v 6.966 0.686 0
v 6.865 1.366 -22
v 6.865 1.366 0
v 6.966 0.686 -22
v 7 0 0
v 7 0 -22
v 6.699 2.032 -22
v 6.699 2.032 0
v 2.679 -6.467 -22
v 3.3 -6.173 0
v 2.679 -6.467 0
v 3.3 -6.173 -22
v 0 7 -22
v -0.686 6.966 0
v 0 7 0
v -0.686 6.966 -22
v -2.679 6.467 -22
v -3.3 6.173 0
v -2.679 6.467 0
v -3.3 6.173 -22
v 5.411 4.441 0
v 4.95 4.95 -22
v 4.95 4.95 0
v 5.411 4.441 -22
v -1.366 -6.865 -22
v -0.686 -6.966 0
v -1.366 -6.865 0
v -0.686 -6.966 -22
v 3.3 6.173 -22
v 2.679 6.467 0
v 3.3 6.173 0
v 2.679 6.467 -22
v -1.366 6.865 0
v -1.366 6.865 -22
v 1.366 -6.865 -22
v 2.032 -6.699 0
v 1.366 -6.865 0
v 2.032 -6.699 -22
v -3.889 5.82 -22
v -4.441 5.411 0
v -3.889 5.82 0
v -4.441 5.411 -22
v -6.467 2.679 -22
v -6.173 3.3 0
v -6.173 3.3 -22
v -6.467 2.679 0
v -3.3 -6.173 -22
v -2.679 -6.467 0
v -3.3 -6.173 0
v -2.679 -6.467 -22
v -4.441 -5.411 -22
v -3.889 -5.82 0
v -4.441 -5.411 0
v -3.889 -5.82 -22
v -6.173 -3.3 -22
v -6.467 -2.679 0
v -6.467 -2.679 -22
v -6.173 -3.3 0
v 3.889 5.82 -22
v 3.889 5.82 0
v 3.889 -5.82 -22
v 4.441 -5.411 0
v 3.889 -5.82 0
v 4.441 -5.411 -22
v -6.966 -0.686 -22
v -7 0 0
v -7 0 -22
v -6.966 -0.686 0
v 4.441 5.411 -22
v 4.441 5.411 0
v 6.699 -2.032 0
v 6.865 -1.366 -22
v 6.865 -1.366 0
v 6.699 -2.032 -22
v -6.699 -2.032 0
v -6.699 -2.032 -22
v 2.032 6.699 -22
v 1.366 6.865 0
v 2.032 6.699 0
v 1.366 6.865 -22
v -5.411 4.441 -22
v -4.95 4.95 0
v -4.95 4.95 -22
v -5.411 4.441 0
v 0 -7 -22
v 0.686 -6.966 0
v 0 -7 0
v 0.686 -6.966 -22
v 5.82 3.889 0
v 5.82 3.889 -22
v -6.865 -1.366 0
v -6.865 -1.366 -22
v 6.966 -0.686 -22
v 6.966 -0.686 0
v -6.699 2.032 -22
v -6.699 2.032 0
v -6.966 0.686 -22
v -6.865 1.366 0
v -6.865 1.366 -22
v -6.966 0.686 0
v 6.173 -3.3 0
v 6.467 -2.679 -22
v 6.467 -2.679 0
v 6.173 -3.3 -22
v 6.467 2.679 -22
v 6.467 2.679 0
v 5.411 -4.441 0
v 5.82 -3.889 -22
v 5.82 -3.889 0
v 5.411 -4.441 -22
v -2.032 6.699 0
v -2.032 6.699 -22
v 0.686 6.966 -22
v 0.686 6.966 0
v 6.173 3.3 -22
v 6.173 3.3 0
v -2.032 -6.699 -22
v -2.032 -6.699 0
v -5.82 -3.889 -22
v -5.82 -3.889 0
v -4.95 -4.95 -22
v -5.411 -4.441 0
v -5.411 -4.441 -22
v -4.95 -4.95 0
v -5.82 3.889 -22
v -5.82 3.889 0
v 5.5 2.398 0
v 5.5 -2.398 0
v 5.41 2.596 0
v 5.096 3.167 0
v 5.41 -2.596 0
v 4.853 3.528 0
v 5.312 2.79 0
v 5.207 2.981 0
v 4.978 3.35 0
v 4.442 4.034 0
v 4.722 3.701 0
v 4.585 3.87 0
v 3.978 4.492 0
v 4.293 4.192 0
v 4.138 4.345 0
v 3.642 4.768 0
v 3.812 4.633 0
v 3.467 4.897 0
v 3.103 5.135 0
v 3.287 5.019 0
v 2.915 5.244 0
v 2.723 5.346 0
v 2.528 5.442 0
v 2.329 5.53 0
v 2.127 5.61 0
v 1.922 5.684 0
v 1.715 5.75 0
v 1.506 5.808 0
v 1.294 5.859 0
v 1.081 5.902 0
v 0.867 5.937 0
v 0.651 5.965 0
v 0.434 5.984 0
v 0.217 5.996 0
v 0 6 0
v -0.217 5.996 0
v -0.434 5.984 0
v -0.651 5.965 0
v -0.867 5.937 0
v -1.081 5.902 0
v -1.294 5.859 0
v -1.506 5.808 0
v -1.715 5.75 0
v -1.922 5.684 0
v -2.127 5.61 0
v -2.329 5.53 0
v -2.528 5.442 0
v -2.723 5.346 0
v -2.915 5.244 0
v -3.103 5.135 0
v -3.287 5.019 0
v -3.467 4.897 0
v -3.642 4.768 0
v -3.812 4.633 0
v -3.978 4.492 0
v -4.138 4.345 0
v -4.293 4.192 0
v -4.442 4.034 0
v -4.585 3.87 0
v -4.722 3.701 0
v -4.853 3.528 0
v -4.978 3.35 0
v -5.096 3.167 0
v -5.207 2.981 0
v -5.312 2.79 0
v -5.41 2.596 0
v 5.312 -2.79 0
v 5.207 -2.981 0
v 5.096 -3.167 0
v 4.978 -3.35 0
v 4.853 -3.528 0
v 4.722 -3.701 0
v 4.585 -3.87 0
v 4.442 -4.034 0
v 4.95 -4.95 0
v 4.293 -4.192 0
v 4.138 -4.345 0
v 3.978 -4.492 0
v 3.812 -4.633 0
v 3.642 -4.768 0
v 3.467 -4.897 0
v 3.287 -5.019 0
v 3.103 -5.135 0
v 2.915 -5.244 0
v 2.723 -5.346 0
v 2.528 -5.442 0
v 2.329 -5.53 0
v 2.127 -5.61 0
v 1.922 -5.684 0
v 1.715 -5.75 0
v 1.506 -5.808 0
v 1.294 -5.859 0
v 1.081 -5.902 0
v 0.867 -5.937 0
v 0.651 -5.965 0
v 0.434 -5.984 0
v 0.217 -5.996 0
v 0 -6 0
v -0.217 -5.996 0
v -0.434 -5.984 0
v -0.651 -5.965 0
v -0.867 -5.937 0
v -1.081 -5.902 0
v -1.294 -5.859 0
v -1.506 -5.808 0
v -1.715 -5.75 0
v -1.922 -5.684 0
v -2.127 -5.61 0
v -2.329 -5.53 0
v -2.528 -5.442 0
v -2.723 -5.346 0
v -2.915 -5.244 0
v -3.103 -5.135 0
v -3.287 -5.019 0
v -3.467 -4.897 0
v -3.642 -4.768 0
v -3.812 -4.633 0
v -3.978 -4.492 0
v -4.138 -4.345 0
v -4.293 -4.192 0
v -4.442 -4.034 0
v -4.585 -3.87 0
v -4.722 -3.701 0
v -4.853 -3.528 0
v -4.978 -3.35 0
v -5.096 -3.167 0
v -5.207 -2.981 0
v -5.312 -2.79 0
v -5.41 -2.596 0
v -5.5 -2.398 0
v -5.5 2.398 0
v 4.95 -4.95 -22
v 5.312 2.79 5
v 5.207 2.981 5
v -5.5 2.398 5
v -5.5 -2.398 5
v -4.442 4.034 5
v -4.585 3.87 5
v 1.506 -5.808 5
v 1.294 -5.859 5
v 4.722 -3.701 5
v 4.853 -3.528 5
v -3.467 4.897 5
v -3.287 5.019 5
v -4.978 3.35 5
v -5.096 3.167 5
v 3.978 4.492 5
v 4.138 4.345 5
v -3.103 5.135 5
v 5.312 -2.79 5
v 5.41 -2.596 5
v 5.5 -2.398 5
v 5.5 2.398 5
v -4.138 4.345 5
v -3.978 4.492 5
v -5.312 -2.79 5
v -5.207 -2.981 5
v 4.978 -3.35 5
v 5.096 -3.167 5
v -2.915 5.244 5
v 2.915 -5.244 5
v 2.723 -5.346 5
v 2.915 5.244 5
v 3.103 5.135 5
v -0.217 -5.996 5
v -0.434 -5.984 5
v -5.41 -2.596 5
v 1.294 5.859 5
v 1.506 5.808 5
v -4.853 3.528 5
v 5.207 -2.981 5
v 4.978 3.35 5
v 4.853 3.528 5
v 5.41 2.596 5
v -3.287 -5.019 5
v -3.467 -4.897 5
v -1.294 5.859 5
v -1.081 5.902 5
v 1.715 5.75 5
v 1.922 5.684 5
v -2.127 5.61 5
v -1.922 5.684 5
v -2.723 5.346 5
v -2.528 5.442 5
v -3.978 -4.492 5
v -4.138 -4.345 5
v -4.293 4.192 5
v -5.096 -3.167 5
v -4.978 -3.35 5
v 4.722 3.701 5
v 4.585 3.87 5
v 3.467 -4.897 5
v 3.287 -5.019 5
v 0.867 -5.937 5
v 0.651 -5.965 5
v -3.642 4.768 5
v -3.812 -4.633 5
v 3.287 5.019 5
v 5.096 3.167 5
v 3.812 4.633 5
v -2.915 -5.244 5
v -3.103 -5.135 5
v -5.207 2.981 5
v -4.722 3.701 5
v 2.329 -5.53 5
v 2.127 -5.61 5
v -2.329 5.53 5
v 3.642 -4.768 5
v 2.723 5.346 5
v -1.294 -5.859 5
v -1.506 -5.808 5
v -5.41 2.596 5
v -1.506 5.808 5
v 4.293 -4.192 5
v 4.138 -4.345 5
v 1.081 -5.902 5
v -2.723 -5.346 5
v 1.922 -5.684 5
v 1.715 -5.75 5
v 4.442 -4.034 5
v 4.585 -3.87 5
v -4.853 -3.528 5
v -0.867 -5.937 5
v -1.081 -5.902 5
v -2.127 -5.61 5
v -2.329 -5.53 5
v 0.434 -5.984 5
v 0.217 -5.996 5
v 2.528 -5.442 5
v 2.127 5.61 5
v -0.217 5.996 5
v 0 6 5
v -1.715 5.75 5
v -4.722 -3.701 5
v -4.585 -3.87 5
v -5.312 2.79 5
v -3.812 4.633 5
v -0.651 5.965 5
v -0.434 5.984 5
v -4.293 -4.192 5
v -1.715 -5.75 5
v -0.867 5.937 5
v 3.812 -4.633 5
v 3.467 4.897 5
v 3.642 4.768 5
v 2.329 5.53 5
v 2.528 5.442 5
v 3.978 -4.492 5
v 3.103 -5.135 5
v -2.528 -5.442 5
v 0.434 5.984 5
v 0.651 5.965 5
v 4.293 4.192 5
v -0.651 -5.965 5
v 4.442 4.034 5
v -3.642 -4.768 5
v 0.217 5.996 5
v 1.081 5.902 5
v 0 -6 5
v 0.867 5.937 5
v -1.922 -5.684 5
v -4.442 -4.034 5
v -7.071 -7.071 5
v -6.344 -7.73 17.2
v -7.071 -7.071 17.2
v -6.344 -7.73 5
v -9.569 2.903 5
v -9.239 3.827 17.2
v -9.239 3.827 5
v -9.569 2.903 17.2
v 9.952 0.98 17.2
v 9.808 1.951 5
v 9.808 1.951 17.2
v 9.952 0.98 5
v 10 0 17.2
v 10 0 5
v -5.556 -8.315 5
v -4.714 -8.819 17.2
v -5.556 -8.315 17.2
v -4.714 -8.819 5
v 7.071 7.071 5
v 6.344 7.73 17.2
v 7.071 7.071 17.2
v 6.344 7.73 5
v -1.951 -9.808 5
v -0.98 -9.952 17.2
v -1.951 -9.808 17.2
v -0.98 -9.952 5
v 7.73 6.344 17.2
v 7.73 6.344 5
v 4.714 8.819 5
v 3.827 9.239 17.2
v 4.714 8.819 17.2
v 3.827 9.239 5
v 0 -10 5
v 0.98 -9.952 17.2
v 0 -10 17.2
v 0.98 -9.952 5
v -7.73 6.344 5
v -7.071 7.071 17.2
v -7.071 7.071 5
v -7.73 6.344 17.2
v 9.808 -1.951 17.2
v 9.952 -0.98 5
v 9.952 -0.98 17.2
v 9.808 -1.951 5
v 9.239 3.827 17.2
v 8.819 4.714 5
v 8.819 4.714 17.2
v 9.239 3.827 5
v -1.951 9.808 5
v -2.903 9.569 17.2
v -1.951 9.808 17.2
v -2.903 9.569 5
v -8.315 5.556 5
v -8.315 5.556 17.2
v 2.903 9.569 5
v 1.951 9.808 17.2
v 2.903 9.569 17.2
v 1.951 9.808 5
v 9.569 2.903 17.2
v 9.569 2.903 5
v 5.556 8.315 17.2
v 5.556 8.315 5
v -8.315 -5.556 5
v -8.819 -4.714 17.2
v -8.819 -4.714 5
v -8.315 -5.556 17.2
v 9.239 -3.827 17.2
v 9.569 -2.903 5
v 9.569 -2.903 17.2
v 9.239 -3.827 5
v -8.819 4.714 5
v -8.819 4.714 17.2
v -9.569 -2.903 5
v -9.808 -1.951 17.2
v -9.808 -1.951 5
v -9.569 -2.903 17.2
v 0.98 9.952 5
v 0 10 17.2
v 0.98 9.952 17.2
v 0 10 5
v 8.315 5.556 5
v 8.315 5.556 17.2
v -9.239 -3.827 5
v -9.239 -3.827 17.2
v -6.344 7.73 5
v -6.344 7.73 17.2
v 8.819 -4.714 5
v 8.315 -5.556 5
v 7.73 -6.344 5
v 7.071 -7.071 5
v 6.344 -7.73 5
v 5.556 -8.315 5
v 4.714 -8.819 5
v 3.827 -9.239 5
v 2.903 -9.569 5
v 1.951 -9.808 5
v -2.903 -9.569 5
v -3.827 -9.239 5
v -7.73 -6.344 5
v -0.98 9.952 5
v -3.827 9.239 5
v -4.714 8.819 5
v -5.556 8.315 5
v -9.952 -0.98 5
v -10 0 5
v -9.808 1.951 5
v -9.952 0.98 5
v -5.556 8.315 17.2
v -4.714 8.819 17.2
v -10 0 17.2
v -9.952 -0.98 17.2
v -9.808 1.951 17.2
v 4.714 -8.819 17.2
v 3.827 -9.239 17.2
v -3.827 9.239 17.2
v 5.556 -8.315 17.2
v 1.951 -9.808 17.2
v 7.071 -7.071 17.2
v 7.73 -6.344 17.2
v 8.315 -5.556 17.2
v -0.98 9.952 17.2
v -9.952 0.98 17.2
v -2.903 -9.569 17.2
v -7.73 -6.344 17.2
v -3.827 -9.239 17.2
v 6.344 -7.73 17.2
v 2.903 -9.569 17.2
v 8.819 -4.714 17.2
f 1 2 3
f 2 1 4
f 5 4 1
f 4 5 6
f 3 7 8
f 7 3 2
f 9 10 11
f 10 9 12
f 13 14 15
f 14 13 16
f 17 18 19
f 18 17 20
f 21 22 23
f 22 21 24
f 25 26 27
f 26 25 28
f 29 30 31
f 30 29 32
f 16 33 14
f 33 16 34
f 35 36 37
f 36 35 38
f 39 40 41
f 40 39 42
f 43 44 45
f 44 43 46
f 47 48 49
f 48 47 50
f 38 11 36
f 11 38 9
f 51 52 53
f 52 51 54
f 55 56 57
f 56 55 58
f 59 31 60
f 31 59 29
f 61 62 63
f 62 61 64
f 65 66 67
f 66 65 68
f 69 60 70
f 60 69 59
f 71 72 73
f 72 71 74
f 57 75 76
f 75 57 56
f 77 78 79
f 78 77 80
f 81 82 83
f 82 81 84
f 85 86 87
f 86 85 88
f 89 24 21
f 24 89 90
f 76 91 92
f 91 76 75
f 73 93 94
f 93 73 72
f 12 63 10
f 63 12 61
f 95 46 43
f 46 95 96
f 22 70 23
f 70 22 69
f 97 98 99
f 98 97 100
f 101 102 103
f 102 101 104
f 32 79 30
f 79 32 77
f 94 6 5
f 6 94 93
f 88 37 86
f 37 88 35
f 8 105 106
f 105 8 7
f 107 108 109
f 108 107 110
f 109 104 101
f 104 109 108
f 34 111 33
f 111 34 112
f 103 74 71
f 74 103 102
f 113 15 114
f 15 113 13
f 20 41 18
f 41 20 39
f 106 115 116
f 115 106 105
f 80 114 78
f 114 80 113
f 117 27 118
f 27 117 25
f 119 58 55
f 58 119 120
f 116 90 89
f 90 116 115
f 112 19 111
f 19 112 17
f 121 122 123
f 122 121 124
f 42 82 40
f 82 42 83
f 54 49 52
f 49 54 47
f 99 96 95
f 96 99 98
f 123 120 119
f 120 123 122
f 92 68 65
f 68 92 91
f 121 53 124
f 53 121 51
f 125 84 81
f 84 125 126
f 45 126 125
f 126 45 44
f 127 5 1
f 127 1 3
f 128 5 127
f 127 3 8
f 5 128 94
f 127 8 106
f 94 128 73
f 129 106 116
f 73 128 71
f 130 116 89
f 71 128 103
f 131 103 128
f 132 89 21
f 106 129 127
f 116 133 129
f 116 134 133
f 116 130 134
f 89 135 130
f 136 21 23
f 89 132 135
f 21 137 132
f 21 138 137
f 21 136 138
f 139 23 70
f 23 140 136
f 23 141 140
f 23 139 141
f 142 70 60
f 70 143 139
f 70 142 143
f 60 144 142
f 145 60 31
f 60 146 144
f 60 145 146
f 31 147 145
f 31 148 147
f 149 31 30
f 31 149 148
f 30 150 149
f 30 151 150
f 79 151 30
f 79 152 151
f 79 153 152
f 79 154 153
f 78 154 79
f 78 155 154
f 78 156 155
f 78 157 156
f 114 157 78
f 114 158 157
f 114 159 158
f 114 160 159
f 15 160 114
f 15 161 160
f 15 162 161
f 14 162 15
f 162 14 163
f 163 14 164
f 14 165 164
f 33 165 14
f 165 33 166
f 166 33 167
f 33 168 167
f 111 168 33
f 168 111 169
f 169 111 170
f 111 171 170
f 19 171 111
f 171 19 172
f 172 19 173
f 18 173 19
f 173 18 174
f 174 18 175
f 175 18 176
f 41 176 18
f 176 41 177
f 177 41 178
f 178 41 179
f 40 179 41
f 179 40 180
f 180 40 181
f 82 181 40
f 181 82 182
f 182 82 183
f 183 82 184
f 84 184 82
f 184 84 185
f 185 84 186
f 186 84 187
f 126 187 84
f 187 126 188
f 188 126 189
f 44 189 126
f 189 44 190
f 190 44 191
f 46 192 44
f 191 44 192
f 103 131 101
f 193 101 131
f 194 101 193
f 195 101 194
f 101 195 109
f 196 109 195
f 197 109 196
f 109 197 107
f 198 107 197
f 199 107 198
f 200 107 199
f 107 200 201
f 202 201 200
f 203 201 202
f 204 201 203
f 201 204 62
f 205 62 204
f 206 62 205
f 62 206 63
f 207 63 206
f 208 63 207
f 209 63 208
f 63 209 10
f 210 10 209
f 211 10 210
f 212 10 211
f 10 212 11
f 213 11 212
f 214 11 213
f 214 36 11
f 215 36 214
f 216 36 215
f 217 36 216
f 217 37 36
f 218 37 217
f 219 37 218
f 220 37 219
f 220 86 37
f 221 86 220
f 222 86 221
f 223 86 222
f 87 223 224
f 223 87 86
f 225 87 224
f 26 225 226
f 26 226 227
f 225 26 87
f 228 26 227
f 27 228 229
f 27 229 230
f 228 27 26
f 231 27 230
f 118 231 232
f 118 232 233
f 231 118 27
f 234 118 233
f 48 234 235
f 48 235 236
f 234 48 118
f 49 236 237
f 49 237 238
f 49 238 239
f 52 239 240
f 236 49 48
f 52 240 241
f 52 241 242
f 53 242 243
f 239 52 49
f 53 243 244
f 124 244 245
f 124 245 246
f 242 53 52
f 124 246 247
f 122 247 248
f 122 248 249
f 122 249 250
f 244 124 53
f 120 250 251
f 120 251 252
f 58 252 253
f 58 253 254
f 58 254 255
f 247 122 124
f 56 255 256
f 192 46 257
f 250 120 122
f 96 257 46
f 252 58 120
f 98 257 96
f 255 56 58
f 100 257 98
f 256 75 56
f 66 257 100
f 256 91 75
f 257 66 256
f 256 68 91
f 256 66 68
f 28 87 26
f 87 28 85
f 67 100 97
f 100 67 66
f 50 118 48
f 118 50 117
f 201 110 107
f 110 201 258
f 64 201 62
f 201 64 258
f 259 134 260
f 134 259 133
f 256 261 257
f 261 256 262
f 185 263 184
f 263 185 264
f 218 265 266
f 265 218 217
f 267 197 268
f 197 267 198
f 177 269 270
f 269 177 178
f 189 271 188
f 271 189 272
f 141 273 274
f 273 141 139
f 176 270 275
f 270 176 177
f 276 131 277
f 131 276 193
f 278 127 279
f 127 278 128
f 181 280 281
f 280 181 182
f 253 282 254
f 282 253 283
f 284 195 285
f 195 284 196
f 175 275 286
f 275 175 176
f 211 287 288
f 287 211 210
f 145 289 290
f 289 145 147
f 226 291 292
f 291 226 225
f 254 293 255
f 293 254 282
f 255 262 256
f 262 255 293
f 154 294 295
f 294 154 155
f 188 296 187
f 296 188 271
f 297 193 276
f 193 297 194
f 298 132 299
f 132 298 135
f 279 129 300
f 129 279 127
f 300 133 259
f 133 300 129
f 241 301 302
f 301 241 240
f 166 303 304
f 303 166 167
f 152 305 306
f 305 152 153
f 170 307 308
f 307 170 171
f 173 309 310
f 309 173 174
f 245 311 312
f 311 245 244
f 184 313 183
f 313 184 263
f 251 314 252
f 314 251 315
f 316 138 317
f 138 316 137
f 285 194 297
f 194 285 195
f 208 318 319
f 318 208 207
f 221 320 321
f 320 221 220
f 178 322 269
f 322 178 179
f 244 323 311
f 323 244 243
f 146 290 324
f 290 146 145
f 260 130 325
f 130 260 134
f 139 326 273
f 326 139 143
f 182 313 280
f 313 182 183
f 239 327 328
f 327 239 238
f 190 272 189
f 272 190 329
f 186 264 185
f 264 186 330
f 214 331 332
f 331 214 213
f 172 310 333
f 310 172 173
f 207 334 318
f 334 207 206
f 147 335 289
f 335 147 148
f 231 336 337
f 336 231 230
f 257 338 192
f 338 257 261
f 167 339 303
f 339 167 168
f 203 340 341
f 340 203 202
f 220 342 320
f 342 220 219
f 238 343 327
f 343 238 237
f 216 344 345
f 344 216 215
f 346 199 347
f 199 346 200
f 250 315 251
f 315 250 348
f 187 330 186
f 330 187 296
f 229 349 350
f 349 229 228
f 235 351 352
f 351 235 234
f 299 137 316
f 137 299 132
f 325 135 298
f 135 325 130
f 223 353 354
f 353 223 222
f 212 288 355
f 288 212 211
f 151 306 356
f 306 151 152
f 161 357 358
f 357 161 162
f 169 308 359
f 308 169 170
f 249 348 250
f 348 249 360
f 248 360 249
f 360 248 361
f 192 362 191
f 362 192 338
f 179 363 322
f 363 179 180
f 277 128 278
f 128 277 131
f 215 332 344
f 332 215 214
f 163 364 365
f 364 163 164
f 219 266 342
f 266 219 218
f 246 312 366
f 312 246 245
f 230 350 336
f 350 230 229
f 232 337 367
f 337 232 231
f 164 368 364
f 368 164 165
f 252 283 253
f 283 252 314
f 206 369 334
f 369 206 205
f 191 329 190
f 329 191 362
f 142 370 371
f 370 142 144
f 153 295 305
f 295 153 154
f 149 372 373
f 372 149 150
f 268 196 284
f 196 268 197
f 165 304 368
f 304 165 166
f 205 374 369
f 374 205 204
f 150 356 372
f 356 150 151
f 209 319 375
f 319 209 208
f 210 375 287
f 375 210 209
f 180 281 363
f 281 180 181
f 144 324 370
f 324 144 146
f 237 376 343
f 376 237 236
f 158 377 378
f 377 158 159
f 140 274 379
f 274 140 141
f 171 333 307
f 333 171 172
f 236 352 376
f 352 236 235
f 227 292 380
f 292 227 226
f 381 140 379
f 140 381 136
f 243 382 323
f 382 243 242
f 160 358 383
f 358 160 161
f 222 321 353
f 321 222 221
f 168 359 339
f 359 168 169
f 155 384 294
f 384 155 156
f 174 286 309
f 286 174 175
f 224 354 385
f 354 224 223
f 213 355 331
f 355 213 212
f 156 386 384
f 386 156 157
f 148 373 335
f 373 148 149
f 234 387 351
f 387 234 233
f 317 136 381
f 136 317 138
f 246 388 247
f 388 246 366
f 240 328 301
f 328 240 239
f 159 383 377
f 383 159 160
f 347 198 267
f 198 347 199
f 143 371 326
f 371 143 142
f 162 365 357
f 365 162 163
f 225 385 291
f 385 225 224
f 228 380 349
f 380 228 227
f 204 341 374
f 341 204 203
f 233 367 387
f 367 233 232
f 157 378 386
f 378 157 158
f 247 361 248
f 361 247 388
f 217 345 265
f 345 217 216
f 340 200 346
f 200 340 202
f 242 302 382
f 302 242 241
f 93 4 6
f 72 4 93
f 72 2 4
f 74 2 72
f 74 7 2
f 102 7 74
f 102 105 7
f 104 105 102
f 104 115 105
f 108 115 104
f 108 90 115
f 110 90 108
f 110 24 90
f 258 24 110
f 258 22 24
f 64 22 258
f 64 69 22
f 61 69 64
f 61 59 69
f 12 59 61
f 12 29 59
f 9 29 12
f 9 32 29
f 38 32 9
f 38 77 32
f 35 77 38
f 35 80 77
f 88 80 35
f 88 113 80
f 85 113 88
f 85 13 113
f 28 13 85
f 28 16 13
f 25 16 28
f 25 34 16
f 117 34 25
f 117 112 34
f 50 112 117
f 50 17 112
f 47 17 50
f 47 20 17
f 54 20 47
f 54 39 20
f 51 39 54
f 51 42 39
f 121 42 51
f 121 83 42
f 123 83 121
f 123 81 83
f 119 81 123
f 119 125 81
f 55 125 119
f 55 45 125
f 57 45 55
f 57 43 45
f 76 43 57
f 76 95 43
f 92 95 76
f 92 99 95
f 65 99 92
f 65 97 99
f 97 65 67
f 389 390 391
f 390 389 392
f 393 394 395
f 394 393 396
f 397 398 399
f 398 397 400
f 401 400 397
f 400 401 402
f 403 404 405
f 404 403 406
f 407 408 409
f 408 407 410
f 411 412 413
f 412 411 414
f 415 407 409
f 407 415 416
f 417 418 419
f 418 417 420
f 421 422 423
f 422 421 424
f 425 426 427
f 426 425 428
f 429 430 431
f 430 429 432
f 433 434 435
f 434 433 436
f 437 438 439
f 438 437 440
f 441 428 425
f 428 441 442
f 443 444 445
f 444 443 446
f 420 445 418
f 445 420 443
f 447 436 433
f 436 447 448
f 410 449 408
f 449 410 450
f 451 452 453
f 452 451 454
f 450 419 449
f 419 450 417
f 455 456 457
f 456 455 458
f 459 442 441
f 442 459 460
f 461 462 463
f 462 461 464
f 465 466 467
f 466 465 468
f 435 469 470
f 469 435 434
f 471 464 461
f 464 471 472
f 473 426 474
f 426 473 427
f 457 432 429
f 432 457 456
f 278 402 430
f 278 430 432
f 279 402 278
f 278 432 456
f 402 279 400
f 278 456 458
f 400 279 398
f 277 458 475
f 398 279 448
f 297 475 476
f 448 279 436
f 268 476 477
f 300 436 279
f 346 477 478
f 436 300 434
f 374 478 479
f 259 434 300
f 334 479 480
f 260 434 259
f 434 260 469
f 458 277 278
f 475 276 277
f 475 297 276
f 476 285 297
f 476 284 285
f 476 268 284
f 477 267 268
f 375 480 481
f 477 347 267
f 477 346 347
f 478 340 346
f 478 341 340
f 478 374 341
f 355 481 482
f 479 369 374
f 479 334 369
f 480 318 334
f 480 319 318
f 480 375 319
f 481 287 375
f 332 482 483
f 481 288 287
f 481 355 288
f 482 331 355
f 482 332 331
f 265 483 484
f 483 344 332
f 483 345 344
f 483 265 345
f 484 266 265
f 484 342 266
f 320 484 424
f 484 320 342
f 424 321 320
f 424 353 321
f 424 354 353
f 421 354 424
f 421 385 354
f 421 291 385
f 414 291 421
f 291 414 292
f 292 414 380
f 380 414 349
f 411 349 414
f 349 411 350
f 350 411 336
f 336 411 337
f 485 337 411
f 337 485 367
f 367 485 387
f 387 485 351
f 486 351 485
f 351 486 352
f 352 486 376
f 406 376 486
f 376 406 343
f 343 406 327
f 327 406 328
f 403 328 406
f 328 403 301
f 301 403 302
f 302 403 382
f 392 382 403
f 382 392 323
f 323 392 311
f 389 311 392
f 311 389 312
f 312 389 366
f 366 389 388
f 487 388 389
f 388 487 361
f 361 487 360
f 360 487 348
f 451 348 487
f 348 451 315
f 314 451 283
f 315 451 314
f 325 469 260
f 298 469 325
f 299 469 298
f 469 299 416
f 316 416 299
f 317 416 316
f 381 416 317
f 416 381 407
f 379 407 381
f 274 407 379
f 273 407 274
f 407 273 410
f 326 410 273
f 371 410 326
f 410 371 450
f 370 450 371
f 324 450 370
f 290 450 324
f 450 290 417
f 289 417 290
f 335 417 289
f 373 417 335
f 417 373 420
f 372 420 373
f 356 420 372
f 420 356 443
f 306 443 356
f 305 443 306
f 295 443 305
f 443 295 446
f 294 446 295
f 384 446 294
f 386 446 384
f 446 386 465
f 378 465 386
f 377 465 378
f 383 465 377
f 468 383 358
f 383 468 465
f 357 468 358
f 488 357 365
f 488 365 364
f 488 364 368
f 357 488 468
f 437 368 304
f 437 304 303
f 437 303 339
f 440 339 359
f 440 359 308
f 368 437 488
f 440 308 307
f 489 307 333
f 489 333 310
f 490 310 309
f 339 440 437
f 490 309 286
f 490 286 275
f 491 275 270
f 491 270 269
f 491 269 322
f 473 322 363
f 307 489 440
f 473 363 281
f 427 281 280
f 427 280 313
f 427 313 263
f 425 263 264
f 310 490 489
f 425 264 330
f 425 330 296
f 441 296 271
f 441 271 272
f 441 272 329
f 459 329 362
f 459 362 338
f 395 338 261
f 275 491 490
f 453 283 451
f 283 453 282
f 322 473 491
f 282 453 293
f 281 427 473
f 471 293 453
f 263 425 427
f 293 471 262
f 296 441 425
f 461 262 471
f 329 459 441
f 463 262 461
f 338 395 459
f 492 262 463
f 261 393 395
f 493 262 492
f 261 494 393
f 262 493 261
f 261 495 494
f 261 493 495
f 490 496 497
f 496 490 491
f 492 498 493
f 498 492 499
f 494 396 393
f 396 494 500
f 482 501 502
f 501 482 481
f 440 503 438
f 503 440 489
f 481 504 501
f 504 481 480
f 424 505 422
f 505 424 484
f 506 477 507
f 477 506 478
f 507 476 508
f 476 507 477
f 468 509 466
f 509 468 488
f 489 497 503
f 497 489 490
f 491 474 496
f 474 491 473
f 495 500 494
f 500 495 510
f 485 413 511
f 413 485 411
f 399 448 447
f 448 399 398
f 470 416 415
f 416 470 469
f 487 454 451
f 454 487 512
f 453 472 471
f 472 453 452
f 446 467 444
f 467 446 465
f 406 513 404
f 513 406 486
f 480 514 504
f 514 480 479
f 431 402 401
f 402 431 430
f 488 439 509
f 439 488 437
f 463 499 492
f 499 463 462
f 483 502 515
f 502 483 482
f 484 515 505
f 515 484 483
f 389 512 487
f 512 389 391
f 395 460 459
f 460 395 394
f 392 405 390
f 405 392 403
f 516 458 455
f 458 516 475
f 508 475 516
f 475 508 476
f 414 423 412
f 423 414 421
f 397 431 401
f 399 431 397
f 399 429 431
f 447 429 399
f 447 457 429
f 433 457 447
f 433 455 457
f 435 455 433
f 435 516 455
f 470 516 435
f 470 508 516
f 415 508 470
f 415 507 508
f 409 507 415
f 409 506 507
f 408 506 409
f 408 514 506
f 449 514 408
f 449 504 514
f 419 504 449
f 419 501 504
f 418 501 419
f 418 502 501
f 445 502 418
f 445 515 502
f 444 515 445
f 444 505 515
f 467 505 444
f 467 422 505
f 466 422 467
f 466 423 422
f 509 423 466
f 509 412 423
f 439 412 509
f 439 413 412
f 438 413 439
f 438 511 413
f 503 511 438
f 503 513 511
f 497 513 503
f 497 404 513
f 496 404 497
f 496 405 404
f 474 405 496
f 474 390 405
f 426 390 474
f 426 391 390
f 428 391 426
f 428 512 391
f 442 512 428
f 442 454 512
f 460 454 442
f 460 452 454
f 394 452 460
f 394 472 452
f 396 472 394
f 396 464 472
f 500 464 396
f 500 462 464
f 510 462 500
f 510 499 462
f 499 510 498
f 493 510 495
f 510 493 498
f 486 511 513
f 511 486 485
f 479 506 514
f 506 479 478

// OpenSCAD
// Start: lazy_union
default_5_default_5();
// End: lazy_union

// Modules.

// 'PartMaterial undef-default - default 5.0'
module default_5_default_5() {
  // 'None : _combine_solids_and_holes'
  union() {
    // 'default : _combine_solids_and_holes'
    union() {
      // 'outer'
      multmatrix(m=[[1.0, 0.0, 0.0, 0.0], [0.0, 1.0, 0.0, 0.0], [0.0, 0.0, 1.0, -2.0], [0.0, 0.0, 0.0, 1.0]]) {
        // 'outer : _combine_solids_and_holes'
        union() {
          // 'outer'
          cylinder(h=2.0, r1=7.0, r2=7.0, center=false, $fn=64);
        }
      }
      // 'body'
      multmatrix(m=[[0.0, -1.0, 0.0, 0.0], [1.0, 0.0, 0.0, 0.0], [0.0, 0.0, 1.0, 0.0], [0.0, 0.0, 0.0, 1.0]]) {
        // 'body : _combine_solids_and_holes'
        union() {
          // 'body'
          linear_extrude(height=11.2, twist=0.0, slices=4, scale=[1.0, 1.0], $fn=64) {
            polygon(points=[[0.0, -5.5], [2.3979157616563596, -5.5], [2.5956140307896067, -5.409509016830283], [2.789903882072988, -5.311914563393699], [2.980530184740023, -5.207344795368711], [3.167242618795151, -5.095937028033964], [3.3497960037202077, -4.977837555953401], [3.52795062043202, -4.85320146087027], [3.7014725260683456, -4.7221924080623], [3.8701338611888003, -4.584982431425432], [4.03371314898736, -4.441751707568363], [4.191995586123549, -4.292688319214509], [4.344773324790391, -4.137988008222093], [4.4918457456487415, -3.9778539185466957], [4.633019721269585, -3.8124963294837526], [4.768109869738382, -3.6421323795413363], [4.896938798088409, -3.46698578130578], [5.019337335243476, -3.287286527674599], [5.13514475416409, -3.1032705898424386], [5.244208982905377, -2.9151796074366576], [5.346386804309622, -2.7232605712094355], [5.4415440440711675, -2.5277654987030735], [5.52955574692675, -2.328951103314398], [5.610306340739891, -2.1270784571928174], [5.683689788263884, -1.9224126484147086], [5.749609726384081, -1.7152224328843098], [5.807979592656652, -1.5057798814182197], [5.858722738977626, -1.2943600224769367], [5.901772532232979, -1.0812404810125857], [5.937072441797577, -0.8667011139070708], [5.964576113768092, -0.6510236424793807], [5.984247431832404, -0.43449128254462044], [5.996060564695558, -0.21738837251055076], [6.0, 0.0], [5.996060564695558, 0.21738837251055076], [5.984247431832404, 0.43449128254462044], [5.964576113768092, 0.6510236424793807], [5.937072441797577, 0.8667011139070708], [5.901772532232979, 1.0812404810125864], [5.858722738977627, 1.294360022476936], [5.807979592656652, 1.5057798814182193], [5.749609726384081, 1.7152224328843098], [5.683689788263884, 1.9224126484147086], [5.610306340739891, 2.1270784571928174], [5.52955574692675, 2.328951103314398], [5.4415440440711675, 2.5277654987030735], [5.346386804309622, 2.7232605712094355], [5.244208982905377, 2.915179607436658], [5.135144754164089, 3.103270589842439], [5.019337335243476, 3.2872865276746], [4.89693879808841, 3.4669857813057794], [4.768109869738382, 3.6421323795413354], [4.633019721269585, 3.8124963294837526], [4.4918457456487415, 3.9778539185466957], [4.344773324790391, 4.137988008222093], [4.191995586123549, 4.292688319214509], [4.03371314898736, 4.441751707568363], [3.8701338611888016, 4.5849824314254315], [3.7014725260683456, 4.7221924080623], [3.5279506204320206, 4.85320146087027], [3.3497960037202077, 4.977837555953402], [3.167242618795151, 5.095937028033964], [2.980530184740022, 5.207344795368712], [2.789903882072988, 5.311914563393699], [2.5956140307896054, 5.409509016830284], [2.3979157616563596, 5.5], [-2.3979157616563596, 5.5], [-2.595614030789606, 5.409509016830283], [-2.7899038820729882, 5.311914563393699], [-2.9805301847400223, 5.207344795368712], [-3.167242618795152, 5.095937028033964], [-3.3497960037202077, 4.977837555953401], [-3.527950620432021, 4.853201460870269], [-3.701472526068346, 4.722192408062299], [-3.8701338611888016, 4.584982431425431], [-4.03371314898736, 4.441751707568363], [-4.191995586123548, 4.292688319214509], [-4.344773324790392, 4.137988008222093], [-4.491845745648741, 3.977853918546696], [-4.633019721269586, 3.8124963294837526], [-4.768109869738382, 3.6421323795413363], [-4.89693879808841, 3.4669857813057785], [-5.019337335243476, 3.287286527674599], [-5.135144754164089, 3.10327058984244], [-5.244208982905377, 2.9151796074366576], [-5.346386804309622, 2.7232605712094364], [-5.441544044071168, 2.527765498703073], [-5.529555746926749, 2.328951103314399], [-5.610306340739891, 2.127078457192817], [-5.683689788263883, 1.9224126484147095], [-5.74960972638408, 1.7152224328843118], [-5.807979592656652, 1.5057798814182197], [-5.858722738977627, 1.2943600224769356], [-5.901772532232979, 1.0812404810125857], [-5.937072441797577, 0.8667011139070717], [-5.964576113768092, 0.65102364247938], [-5.984247431832404, 0.4344912825446212], [-5.996060564695558, 0.21738837251055285], [-6.0, 7.347880794884119e-16], [-5.996060564695558, -0.21738837251055138], [-5.984247431832404, -0.4344912825446197], [-5.964576113768093, -0.6510236424793786], [-5.937072441797577, -0.8667011139070702], [-5.901772532232979, -1.0812404810125842], [-5.858722738977627, -1.294360022476934], [-5.807979592656652, -1.5057798814182184], [-5.749609726384081, -1.7152224328843104], [-5.683689788263884, -1.9224126484147082], [-5.610306340739891, -2.127078457192815], [-5.52955574692675, -2.3289511033143975], [-5.441544044071169, -2.527765498703072], [-5.346386804309624, -2.7232605712094324], [-5.244208982905378, -2.9151796074366563], [-5.13514475416409, -3.1032705898424386], [-5.019337335243477, -3.2872865276745977], [-4.89693879808841, -3.4669857813057776], [-4.768109869738383, -3.6421323795413345], [-4.633019721269585, -3.8124963294837535], [-4.491845745648742, -3.9778539185466957], [-4.344773324790394, -4.1379880082220915], [-4.19199558612355, -4.292688319214508], [-4.033713148987362, -4.441751707568362], [-3.870133861188803, -4.584982431425431], [-3.701472526068348, -4.722192408062298], [-3.5279506204320246, -4.853201460870267], [-3.3497960037202112, -4.977837555953398], [-3.1672426187951532, -5.095937028033964], [-2.9805301847400236, -5.20734479536871], [-2.7899038820729873, -5.3119145633936995], [-2.595614030789605, -5.409509016830284], [-2.3979157616563613, -5.5]]);
          }
        }
      }
      // 'top_access_hole'
      multmatrix(m=[[1.0, 0.0, 0.0, 0.0], [0.0, 1.0, 0.0, 0.0], [0.0, 0.0, 1.0, -22.0], [0.0, 0.0, 0.0, 1.0]]) {
        // 'top_access_hole'
        color(c=[0.0, 1.0, 1.0, 1.0]) {
          // 'top_access_hole : _combine_solids_and_holes'
          union() {
            // 'top_access_hole'
            cylinder(h=20.0, r1=7.0, r2=7.0, center=false, $fn=64);
          }
        }
      }
      // 'rear_access_hole'
      multmatrix(m=[[1.0, 0.0, 0.0, 0.0], [0.0, 1.0, 0.0, 0.0], [0.0, 0.0, 1.0, 5.0], [0.0, 0.0, 0.0, 1.0]]) {
        // 'rear_access_hole'
        color(c=[1.0, 0.7529411764705882, 0.796078431372549, 1.0]) {
          // 'rear_access_hole : _combine_solids_and_holes'
          union() {
            // 'rear_access_hole'
            cylinder(h=12.2, r1=10.0, r2=10.0, center=false, $fn=64);
          }
        }
      }
    }
  }
} // end module default_5_default_5
